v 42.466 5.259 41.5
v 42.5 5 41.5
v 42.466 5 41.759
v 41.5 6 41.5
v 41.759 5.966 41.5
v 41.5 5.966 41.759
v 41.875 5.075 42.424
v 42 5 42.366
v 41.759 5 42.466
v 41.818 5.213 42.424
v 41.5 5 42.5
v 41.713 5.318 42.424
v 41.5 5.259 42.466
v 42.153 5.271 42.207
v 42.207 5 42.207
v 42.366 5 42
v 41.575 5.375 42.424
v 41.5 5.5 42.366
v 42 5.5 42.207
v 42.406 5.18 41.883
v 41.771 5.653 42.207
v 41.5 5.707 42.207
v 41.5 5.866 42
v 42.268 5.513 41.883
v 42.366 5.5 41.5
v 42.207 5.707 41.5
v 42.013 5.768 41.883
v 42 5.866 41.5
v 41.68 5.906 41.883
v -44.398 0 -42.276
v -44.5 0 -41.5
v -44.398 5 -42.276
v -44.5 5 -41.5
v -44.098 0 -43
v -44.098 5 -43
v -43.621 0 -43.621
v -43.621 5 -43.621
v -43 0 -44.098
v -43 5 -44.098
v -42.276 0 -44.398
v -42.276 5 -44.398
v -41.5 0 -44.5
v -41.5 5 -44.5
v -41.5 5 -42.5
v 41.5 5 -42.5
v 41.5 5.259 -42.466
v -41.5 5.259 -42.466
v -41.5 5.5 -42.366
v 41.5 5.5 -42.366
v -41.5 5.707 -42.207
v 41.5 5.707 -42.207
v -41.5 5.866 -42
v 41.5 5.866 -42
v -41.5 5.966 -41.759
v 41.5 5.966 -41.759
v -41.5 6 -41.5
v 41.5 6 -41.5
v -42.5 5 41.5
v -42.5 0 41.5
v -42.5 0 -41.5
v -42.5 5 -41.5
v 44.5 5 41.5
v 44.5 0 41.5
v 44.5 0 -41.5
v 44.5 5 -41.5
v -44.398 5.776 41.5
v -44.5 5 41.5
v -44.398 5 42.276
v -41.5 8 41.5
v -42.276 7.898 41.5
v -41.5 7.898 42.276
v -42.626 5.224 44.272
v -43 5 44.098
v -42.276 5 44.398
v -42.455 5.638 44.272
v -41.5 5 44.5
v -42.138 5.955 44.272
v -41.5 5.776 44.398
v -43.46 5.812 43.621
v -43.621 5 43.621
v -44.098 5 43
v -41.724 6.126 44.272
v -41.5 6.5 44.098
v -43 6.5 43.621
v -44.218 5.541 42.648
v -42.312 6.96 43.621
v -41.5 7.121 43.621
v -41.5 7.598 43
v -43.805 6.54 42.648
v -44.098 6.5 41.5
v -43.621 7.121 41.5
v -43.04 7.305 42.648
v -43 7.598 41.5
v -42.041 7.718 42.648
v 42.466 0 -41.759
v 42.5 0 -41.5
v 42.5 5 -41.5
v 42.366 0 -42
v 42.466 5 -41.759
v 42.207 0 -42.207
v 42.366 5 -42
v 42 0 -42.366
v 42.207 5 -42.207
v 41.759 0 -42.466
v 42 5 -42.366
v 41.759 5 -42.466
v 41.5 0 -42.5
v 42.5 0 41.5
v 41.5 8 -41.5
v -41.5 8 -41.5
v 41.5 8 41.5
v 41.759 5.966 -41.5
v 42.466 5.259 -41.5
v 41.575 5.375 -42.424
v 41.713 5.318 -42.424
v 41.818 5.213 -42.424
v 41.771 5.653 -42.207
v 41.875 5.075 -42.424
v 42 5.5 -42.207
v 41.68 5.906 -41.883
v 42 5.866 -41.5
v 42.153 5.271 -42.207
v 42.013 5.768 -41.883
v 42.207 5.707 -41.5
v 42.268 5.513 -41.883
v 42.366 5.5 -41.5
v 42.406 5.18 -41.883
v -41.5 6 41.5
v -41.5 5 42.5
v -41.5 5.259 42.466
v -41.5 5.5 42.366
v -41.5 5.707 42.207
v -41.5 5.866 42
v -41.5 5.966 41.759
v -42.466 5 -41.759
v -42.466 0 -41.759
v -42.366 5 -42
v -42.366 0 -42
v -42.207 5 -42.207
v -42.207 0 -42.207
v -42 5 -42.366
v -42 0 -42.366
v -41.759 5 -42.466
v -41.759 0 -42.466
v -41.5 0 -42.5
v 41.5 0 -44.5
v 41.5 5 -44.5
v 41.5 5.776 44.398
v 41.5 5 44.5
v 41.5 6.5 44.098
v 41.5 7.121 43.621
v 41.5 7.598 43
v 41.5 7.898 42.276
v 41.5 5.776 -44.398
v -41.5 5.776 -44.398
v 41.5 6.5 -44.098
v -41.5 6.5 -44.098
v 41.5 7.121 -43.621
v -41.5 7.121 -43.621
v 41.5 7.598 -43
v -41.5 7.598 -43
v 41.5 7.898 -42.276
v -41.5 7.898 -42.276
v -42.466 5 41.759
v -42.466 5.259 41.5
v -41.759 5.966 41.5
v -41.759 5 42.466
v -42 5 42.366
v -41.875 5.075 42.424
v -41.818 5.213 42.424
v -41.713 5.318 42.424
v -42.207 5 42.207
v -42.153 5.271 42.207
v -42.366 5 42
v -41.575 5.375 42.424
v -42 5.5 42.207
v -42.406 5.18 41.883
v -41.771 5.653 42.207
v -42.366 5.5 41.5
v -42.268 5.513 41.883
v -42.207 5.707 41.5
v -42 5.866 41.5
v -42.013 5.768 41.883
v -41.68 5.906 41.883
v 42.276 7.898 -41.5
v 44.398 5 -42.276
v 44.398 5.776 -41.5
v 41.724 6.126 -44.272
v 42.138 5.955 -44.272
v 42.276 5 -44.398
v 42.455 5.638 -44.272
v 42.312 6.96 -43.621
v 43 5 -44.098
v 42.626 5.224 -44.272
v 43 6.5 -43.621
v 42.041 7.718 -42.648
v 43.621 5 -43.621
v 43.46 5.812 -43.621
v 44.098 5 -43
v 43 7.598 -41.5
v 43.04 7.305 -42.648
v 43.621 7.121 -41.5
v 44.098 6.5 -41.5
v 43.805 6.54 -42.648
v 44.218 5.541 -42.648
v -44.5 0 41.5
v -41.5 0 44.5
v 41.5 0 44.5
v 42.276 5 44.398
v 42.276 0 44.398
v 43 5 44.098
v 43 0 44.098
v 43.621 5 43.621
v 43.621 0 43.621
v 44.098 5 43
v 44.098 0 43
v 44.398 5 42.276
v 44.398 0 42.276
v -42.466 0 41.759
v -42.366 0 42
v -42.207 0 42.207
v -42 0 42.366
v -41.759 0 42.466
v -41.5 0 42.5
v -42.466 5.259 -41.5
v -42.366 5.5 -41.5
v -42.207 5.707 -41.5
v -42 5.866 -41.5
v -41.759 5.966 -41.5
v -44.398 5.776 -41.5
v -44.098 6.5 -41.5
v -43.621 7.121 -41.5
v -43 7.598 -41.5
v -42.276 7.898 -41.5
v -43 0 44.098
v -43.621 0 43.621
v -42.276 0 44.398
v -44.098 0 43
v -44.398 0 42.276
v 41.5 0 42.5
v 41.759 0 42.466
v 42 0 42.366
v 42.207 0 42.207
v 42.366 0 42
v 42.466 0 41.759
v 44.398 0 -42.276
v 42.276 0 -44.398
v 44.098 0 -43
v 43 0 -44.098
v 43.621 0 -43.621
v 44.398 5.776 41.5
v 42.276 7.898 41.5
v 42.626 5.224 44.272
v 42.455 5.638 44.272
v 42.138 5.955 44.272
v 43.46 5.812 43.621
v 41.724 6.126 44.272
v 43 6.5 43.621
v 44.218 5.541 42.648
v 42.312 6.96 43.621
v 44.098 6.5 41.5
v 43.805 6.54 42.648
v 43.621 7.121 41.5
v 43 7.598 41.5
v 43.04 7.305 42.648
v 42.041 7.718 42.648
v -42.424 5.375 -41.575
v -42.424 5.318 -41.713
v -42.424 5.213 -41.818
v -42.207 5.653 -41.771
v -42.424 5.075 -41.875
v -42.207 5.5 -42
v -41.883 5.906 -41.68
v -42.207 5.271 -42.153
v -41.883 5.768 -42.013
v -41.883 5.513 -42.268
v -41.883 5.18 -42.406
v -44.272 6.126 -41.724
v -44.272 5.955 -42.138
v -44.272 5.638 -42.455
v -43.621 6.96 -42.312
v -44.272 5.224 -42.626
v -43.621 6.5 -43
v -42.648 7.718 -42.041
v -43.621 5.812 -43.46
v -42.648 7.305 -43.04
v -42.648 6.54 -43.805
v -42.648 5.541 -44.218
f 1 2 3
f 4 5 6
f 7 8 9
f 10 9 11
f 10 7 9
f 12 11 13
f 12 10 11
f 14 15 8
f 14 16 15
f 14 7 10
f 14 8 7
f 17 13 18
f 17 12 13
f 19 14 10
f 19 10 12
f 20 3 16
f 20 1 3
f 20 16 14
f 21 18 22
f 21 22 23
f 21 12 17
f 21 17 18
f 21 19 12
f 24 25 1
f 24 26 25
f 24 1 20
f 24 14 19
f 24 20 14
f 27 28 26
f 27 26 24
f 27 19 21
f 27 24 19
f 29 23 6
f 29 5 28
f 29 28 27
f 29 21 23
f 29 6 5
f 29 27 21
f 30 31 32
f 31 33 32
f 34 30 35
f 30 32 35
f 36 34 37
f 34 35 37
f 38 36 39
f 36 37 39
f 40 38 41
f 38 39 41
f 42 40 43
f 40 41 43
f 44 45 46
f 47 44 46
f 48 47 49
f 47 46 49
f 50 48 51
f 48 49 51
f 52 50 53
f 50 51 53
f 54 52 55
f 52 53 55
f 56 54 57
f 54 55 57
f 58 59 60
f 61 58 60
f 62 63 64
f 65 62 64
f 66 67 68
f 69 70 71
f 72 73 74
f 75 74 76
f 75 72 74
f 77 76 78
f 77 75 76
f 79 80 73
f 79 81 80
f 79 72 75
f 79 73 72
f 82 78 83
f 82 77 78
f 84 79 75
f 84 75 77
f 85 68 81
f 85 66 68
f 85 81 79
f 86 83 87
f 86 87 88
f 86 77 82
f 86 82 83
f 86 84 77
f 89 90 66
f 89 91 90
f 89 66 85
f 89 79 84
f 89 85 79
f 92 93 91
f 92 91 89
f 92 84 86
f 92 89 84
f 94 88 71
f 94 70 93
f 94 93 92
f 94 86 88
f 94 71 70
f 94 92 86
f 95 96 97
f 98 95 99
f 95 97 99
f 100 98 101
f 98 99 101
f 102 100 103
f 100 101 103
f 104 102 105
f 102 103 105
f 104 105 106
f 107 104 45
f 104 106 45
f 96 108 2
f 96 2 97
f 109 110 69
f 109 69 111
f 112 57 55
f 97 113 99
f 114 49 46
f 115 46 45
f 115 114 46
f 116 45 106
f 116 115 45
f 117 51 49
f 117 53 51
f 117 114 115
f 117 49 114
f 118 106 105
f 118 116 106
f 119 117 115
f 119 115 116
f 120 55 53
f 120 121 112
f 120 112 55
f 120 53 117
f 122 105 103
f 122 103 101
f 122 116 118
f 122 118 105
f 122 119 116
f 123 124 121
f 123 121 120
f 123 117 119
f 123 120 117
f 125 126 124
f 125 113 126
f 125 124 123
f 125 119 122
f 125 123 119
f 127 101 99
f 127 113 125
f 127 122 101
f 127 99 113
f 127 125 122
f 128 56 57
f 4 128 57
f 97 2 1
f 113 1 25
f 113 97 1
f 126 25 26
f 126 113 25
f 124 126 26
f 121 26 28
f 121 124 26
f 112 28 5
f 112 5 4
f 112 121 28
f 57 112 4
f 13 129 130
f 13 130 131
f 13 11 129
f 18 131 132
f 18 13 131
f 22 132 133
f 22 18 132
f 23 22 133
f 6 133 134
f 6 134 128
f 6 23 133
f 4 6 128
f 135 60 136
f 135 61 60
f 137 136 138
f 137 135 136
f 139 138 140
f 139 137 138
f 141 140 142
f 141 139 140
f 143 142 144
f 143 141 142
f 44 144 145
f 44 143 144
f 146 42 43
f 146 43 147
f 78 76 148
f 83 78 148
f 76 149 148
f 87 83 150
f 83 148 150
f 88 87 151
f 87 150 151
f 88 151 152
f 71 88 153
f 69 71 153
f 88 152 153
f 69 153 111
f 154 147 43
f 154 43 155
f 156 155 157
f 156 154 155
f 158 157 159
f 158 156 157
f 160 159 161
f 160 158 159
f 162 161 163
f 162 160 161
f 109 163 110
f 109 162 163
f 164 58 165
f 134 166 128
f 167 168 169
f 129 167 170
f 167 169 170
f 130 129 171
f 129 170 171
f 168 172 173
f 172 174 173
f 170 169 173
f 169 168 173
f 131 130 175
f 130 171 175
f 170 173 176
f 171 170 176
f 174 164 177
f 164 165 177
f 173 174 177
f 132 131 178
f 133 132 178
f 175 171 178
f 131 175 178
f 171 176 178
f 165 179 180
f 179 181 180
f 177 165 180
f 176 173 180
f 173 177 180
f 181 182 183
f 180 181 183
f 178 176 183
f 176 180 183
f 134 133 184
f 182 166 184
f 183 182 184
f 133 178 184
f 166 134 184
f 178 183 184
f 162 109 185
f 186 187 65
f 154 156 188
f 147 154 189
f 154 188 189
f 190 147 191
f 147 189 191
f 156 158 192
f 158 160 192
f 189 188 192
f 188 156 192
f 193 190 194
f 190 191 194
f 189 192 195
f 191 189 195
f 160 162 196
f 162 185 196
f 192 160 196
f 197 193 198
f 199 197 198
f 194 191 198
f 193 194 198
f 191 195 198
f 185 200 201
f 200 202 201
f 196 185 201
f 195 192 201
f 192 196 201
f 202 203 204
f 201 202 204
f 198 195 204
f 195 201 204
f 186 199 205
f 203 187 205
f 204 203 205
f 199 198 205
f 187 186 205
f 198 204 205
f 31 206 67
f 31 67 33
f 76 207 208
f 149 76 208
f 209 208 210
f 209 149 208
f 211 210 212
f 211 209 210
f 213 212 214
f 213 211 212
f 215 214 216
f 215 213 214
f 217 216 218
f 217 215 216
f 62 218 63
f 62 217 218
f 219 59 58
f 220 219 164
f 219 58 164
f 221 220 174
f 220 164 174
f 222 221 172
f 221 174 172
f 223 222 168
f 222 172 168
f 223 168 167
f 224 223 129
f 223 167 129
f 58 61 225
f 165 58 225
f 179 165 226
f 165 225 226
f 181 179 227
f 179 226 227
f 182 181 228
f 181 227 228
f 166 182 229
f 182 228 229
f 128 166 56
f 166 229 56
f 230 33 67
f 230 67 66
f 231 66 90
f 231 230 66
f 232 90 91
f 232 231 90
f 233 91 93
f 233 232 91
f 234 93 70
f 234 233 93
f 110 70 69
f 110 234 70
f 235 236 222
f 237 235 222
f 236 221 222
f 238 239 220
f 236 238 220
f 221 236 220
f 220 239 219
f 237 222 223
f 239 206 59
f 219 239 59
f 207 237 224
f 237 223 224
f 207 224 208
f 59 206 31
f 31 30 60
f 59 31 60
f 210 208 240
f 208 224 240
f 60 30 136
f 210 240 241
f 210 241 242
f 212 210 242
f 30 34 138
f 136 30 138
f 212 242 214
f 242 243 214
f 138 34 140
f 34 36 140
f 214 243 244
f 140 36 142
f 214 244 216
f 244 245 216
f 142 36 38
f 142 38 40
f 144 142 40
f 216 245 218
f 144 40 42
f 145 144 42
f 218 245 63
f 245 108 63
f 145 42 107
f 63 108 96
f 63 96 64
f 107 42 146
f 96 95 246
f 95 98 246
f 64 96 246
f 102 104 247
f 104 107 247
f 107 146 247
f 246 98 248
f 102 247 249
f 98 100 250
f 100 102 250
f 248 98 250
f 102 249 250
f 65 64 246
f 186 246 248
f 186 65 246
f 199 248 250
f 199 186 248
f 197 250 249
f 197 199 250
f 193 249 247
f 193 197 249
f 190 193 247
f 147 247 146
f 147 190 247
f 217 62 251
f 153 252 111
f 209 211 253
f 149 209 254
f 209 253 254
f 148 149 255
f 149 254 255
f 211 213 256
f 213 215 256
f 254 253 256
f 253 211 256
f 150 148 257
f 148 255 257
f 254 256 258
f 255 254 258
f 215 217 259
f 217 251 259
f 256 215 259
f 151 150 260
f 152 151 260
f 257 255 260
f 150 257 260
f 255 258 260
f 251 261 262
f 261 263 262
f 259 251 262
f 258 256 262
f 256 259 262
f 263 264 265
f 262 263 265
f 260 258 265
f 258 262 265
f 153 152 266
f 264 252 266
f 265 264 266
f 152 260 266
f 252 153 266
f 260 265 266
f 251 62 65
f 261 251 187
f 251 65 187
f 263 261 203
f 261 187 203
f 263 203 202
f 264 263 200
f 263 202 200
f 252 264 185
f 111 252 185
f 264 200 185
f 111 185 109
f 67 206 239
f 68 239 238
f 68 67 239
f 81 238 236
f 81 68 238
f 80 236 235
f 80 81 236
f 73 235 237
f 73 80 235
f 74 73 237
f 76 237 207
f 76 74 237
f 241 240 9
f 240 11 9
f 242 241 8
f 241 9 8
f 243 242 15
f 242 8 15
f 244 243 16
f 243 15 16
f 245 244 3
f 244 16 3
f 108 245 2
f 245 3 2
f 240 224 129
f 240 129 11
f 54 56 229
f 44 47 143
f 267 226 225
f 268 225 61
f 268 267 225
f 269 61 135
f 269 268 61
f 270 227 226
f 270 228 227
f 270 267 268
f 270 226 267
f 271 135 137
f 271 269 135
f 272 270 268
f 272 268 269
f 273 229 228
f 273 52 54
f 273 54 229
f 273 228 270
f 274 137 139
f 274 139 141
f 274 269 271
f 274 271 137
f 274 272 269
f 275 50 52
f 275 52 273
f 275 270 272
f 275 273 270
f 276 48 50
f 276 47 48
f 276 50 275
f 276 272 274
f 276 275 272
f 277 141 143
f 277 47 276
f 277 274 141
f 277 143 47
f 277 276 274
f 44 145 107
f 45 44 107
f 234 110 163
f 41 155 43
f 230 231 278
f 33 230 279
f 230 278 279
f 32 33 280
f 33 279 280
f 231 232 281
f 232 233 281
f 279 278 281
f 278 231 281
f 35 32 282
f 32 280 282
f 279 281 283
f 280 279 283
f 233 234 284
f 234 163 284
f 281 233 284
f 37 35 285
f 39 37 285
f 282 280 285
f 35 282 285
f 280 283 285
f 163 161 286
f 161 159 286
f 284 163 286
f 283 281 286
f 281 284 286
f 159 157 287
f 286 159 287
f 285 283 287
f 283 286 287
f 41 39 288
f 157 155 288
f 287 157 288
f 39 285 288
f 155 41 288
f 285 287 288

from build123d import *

# Parameters (mm, degrees)
SKETCH1_W           = 89
SKETCH1_H           = 89
BOSS_EXTRUDE1_DEPTH = 8
FILLET1_R           = 3
SHELL1_T            = -2


with BuildPart() as part:
    # Sketch1 → Boss-Extrude1 (new body)
    with BuildSketch(Plane(origin=(0, 0, 0), x_dir=(1, 0, 0), z_dir=(0, 1, 0))):
        Rectangle(SKETCH1_W, SKETCH1_H)
    extrude(amount=BOSS_EXTRUDE1_DEPTH)

    # Fillet1
    fillet1_edges = [part.edges().sort_by_distance(p)[0] for p in [
        (44.5, 8, 0),
        (0, 8, -44.5),
        (-44.5, 8, 0),
        (-44.5, 4, -44.5),
        (44.5, 4, -44.5),
        (44.5, 4, 44.5),
        (-44.5, 4, 44.5),
        (0, 8, 44.5),
    ]]
    fillet(fillet1_edges, radius=FILLET1_R)

    # Shell1
    shell1_openings = [part.faces().sort_by_distance(p)[0] for p in [
        (0, 0, 0),
    ]]
    offset(amount=SHELL1_T, openings=shell1_openings, kind=Kind.INTERSECTION)


solid = part.part
